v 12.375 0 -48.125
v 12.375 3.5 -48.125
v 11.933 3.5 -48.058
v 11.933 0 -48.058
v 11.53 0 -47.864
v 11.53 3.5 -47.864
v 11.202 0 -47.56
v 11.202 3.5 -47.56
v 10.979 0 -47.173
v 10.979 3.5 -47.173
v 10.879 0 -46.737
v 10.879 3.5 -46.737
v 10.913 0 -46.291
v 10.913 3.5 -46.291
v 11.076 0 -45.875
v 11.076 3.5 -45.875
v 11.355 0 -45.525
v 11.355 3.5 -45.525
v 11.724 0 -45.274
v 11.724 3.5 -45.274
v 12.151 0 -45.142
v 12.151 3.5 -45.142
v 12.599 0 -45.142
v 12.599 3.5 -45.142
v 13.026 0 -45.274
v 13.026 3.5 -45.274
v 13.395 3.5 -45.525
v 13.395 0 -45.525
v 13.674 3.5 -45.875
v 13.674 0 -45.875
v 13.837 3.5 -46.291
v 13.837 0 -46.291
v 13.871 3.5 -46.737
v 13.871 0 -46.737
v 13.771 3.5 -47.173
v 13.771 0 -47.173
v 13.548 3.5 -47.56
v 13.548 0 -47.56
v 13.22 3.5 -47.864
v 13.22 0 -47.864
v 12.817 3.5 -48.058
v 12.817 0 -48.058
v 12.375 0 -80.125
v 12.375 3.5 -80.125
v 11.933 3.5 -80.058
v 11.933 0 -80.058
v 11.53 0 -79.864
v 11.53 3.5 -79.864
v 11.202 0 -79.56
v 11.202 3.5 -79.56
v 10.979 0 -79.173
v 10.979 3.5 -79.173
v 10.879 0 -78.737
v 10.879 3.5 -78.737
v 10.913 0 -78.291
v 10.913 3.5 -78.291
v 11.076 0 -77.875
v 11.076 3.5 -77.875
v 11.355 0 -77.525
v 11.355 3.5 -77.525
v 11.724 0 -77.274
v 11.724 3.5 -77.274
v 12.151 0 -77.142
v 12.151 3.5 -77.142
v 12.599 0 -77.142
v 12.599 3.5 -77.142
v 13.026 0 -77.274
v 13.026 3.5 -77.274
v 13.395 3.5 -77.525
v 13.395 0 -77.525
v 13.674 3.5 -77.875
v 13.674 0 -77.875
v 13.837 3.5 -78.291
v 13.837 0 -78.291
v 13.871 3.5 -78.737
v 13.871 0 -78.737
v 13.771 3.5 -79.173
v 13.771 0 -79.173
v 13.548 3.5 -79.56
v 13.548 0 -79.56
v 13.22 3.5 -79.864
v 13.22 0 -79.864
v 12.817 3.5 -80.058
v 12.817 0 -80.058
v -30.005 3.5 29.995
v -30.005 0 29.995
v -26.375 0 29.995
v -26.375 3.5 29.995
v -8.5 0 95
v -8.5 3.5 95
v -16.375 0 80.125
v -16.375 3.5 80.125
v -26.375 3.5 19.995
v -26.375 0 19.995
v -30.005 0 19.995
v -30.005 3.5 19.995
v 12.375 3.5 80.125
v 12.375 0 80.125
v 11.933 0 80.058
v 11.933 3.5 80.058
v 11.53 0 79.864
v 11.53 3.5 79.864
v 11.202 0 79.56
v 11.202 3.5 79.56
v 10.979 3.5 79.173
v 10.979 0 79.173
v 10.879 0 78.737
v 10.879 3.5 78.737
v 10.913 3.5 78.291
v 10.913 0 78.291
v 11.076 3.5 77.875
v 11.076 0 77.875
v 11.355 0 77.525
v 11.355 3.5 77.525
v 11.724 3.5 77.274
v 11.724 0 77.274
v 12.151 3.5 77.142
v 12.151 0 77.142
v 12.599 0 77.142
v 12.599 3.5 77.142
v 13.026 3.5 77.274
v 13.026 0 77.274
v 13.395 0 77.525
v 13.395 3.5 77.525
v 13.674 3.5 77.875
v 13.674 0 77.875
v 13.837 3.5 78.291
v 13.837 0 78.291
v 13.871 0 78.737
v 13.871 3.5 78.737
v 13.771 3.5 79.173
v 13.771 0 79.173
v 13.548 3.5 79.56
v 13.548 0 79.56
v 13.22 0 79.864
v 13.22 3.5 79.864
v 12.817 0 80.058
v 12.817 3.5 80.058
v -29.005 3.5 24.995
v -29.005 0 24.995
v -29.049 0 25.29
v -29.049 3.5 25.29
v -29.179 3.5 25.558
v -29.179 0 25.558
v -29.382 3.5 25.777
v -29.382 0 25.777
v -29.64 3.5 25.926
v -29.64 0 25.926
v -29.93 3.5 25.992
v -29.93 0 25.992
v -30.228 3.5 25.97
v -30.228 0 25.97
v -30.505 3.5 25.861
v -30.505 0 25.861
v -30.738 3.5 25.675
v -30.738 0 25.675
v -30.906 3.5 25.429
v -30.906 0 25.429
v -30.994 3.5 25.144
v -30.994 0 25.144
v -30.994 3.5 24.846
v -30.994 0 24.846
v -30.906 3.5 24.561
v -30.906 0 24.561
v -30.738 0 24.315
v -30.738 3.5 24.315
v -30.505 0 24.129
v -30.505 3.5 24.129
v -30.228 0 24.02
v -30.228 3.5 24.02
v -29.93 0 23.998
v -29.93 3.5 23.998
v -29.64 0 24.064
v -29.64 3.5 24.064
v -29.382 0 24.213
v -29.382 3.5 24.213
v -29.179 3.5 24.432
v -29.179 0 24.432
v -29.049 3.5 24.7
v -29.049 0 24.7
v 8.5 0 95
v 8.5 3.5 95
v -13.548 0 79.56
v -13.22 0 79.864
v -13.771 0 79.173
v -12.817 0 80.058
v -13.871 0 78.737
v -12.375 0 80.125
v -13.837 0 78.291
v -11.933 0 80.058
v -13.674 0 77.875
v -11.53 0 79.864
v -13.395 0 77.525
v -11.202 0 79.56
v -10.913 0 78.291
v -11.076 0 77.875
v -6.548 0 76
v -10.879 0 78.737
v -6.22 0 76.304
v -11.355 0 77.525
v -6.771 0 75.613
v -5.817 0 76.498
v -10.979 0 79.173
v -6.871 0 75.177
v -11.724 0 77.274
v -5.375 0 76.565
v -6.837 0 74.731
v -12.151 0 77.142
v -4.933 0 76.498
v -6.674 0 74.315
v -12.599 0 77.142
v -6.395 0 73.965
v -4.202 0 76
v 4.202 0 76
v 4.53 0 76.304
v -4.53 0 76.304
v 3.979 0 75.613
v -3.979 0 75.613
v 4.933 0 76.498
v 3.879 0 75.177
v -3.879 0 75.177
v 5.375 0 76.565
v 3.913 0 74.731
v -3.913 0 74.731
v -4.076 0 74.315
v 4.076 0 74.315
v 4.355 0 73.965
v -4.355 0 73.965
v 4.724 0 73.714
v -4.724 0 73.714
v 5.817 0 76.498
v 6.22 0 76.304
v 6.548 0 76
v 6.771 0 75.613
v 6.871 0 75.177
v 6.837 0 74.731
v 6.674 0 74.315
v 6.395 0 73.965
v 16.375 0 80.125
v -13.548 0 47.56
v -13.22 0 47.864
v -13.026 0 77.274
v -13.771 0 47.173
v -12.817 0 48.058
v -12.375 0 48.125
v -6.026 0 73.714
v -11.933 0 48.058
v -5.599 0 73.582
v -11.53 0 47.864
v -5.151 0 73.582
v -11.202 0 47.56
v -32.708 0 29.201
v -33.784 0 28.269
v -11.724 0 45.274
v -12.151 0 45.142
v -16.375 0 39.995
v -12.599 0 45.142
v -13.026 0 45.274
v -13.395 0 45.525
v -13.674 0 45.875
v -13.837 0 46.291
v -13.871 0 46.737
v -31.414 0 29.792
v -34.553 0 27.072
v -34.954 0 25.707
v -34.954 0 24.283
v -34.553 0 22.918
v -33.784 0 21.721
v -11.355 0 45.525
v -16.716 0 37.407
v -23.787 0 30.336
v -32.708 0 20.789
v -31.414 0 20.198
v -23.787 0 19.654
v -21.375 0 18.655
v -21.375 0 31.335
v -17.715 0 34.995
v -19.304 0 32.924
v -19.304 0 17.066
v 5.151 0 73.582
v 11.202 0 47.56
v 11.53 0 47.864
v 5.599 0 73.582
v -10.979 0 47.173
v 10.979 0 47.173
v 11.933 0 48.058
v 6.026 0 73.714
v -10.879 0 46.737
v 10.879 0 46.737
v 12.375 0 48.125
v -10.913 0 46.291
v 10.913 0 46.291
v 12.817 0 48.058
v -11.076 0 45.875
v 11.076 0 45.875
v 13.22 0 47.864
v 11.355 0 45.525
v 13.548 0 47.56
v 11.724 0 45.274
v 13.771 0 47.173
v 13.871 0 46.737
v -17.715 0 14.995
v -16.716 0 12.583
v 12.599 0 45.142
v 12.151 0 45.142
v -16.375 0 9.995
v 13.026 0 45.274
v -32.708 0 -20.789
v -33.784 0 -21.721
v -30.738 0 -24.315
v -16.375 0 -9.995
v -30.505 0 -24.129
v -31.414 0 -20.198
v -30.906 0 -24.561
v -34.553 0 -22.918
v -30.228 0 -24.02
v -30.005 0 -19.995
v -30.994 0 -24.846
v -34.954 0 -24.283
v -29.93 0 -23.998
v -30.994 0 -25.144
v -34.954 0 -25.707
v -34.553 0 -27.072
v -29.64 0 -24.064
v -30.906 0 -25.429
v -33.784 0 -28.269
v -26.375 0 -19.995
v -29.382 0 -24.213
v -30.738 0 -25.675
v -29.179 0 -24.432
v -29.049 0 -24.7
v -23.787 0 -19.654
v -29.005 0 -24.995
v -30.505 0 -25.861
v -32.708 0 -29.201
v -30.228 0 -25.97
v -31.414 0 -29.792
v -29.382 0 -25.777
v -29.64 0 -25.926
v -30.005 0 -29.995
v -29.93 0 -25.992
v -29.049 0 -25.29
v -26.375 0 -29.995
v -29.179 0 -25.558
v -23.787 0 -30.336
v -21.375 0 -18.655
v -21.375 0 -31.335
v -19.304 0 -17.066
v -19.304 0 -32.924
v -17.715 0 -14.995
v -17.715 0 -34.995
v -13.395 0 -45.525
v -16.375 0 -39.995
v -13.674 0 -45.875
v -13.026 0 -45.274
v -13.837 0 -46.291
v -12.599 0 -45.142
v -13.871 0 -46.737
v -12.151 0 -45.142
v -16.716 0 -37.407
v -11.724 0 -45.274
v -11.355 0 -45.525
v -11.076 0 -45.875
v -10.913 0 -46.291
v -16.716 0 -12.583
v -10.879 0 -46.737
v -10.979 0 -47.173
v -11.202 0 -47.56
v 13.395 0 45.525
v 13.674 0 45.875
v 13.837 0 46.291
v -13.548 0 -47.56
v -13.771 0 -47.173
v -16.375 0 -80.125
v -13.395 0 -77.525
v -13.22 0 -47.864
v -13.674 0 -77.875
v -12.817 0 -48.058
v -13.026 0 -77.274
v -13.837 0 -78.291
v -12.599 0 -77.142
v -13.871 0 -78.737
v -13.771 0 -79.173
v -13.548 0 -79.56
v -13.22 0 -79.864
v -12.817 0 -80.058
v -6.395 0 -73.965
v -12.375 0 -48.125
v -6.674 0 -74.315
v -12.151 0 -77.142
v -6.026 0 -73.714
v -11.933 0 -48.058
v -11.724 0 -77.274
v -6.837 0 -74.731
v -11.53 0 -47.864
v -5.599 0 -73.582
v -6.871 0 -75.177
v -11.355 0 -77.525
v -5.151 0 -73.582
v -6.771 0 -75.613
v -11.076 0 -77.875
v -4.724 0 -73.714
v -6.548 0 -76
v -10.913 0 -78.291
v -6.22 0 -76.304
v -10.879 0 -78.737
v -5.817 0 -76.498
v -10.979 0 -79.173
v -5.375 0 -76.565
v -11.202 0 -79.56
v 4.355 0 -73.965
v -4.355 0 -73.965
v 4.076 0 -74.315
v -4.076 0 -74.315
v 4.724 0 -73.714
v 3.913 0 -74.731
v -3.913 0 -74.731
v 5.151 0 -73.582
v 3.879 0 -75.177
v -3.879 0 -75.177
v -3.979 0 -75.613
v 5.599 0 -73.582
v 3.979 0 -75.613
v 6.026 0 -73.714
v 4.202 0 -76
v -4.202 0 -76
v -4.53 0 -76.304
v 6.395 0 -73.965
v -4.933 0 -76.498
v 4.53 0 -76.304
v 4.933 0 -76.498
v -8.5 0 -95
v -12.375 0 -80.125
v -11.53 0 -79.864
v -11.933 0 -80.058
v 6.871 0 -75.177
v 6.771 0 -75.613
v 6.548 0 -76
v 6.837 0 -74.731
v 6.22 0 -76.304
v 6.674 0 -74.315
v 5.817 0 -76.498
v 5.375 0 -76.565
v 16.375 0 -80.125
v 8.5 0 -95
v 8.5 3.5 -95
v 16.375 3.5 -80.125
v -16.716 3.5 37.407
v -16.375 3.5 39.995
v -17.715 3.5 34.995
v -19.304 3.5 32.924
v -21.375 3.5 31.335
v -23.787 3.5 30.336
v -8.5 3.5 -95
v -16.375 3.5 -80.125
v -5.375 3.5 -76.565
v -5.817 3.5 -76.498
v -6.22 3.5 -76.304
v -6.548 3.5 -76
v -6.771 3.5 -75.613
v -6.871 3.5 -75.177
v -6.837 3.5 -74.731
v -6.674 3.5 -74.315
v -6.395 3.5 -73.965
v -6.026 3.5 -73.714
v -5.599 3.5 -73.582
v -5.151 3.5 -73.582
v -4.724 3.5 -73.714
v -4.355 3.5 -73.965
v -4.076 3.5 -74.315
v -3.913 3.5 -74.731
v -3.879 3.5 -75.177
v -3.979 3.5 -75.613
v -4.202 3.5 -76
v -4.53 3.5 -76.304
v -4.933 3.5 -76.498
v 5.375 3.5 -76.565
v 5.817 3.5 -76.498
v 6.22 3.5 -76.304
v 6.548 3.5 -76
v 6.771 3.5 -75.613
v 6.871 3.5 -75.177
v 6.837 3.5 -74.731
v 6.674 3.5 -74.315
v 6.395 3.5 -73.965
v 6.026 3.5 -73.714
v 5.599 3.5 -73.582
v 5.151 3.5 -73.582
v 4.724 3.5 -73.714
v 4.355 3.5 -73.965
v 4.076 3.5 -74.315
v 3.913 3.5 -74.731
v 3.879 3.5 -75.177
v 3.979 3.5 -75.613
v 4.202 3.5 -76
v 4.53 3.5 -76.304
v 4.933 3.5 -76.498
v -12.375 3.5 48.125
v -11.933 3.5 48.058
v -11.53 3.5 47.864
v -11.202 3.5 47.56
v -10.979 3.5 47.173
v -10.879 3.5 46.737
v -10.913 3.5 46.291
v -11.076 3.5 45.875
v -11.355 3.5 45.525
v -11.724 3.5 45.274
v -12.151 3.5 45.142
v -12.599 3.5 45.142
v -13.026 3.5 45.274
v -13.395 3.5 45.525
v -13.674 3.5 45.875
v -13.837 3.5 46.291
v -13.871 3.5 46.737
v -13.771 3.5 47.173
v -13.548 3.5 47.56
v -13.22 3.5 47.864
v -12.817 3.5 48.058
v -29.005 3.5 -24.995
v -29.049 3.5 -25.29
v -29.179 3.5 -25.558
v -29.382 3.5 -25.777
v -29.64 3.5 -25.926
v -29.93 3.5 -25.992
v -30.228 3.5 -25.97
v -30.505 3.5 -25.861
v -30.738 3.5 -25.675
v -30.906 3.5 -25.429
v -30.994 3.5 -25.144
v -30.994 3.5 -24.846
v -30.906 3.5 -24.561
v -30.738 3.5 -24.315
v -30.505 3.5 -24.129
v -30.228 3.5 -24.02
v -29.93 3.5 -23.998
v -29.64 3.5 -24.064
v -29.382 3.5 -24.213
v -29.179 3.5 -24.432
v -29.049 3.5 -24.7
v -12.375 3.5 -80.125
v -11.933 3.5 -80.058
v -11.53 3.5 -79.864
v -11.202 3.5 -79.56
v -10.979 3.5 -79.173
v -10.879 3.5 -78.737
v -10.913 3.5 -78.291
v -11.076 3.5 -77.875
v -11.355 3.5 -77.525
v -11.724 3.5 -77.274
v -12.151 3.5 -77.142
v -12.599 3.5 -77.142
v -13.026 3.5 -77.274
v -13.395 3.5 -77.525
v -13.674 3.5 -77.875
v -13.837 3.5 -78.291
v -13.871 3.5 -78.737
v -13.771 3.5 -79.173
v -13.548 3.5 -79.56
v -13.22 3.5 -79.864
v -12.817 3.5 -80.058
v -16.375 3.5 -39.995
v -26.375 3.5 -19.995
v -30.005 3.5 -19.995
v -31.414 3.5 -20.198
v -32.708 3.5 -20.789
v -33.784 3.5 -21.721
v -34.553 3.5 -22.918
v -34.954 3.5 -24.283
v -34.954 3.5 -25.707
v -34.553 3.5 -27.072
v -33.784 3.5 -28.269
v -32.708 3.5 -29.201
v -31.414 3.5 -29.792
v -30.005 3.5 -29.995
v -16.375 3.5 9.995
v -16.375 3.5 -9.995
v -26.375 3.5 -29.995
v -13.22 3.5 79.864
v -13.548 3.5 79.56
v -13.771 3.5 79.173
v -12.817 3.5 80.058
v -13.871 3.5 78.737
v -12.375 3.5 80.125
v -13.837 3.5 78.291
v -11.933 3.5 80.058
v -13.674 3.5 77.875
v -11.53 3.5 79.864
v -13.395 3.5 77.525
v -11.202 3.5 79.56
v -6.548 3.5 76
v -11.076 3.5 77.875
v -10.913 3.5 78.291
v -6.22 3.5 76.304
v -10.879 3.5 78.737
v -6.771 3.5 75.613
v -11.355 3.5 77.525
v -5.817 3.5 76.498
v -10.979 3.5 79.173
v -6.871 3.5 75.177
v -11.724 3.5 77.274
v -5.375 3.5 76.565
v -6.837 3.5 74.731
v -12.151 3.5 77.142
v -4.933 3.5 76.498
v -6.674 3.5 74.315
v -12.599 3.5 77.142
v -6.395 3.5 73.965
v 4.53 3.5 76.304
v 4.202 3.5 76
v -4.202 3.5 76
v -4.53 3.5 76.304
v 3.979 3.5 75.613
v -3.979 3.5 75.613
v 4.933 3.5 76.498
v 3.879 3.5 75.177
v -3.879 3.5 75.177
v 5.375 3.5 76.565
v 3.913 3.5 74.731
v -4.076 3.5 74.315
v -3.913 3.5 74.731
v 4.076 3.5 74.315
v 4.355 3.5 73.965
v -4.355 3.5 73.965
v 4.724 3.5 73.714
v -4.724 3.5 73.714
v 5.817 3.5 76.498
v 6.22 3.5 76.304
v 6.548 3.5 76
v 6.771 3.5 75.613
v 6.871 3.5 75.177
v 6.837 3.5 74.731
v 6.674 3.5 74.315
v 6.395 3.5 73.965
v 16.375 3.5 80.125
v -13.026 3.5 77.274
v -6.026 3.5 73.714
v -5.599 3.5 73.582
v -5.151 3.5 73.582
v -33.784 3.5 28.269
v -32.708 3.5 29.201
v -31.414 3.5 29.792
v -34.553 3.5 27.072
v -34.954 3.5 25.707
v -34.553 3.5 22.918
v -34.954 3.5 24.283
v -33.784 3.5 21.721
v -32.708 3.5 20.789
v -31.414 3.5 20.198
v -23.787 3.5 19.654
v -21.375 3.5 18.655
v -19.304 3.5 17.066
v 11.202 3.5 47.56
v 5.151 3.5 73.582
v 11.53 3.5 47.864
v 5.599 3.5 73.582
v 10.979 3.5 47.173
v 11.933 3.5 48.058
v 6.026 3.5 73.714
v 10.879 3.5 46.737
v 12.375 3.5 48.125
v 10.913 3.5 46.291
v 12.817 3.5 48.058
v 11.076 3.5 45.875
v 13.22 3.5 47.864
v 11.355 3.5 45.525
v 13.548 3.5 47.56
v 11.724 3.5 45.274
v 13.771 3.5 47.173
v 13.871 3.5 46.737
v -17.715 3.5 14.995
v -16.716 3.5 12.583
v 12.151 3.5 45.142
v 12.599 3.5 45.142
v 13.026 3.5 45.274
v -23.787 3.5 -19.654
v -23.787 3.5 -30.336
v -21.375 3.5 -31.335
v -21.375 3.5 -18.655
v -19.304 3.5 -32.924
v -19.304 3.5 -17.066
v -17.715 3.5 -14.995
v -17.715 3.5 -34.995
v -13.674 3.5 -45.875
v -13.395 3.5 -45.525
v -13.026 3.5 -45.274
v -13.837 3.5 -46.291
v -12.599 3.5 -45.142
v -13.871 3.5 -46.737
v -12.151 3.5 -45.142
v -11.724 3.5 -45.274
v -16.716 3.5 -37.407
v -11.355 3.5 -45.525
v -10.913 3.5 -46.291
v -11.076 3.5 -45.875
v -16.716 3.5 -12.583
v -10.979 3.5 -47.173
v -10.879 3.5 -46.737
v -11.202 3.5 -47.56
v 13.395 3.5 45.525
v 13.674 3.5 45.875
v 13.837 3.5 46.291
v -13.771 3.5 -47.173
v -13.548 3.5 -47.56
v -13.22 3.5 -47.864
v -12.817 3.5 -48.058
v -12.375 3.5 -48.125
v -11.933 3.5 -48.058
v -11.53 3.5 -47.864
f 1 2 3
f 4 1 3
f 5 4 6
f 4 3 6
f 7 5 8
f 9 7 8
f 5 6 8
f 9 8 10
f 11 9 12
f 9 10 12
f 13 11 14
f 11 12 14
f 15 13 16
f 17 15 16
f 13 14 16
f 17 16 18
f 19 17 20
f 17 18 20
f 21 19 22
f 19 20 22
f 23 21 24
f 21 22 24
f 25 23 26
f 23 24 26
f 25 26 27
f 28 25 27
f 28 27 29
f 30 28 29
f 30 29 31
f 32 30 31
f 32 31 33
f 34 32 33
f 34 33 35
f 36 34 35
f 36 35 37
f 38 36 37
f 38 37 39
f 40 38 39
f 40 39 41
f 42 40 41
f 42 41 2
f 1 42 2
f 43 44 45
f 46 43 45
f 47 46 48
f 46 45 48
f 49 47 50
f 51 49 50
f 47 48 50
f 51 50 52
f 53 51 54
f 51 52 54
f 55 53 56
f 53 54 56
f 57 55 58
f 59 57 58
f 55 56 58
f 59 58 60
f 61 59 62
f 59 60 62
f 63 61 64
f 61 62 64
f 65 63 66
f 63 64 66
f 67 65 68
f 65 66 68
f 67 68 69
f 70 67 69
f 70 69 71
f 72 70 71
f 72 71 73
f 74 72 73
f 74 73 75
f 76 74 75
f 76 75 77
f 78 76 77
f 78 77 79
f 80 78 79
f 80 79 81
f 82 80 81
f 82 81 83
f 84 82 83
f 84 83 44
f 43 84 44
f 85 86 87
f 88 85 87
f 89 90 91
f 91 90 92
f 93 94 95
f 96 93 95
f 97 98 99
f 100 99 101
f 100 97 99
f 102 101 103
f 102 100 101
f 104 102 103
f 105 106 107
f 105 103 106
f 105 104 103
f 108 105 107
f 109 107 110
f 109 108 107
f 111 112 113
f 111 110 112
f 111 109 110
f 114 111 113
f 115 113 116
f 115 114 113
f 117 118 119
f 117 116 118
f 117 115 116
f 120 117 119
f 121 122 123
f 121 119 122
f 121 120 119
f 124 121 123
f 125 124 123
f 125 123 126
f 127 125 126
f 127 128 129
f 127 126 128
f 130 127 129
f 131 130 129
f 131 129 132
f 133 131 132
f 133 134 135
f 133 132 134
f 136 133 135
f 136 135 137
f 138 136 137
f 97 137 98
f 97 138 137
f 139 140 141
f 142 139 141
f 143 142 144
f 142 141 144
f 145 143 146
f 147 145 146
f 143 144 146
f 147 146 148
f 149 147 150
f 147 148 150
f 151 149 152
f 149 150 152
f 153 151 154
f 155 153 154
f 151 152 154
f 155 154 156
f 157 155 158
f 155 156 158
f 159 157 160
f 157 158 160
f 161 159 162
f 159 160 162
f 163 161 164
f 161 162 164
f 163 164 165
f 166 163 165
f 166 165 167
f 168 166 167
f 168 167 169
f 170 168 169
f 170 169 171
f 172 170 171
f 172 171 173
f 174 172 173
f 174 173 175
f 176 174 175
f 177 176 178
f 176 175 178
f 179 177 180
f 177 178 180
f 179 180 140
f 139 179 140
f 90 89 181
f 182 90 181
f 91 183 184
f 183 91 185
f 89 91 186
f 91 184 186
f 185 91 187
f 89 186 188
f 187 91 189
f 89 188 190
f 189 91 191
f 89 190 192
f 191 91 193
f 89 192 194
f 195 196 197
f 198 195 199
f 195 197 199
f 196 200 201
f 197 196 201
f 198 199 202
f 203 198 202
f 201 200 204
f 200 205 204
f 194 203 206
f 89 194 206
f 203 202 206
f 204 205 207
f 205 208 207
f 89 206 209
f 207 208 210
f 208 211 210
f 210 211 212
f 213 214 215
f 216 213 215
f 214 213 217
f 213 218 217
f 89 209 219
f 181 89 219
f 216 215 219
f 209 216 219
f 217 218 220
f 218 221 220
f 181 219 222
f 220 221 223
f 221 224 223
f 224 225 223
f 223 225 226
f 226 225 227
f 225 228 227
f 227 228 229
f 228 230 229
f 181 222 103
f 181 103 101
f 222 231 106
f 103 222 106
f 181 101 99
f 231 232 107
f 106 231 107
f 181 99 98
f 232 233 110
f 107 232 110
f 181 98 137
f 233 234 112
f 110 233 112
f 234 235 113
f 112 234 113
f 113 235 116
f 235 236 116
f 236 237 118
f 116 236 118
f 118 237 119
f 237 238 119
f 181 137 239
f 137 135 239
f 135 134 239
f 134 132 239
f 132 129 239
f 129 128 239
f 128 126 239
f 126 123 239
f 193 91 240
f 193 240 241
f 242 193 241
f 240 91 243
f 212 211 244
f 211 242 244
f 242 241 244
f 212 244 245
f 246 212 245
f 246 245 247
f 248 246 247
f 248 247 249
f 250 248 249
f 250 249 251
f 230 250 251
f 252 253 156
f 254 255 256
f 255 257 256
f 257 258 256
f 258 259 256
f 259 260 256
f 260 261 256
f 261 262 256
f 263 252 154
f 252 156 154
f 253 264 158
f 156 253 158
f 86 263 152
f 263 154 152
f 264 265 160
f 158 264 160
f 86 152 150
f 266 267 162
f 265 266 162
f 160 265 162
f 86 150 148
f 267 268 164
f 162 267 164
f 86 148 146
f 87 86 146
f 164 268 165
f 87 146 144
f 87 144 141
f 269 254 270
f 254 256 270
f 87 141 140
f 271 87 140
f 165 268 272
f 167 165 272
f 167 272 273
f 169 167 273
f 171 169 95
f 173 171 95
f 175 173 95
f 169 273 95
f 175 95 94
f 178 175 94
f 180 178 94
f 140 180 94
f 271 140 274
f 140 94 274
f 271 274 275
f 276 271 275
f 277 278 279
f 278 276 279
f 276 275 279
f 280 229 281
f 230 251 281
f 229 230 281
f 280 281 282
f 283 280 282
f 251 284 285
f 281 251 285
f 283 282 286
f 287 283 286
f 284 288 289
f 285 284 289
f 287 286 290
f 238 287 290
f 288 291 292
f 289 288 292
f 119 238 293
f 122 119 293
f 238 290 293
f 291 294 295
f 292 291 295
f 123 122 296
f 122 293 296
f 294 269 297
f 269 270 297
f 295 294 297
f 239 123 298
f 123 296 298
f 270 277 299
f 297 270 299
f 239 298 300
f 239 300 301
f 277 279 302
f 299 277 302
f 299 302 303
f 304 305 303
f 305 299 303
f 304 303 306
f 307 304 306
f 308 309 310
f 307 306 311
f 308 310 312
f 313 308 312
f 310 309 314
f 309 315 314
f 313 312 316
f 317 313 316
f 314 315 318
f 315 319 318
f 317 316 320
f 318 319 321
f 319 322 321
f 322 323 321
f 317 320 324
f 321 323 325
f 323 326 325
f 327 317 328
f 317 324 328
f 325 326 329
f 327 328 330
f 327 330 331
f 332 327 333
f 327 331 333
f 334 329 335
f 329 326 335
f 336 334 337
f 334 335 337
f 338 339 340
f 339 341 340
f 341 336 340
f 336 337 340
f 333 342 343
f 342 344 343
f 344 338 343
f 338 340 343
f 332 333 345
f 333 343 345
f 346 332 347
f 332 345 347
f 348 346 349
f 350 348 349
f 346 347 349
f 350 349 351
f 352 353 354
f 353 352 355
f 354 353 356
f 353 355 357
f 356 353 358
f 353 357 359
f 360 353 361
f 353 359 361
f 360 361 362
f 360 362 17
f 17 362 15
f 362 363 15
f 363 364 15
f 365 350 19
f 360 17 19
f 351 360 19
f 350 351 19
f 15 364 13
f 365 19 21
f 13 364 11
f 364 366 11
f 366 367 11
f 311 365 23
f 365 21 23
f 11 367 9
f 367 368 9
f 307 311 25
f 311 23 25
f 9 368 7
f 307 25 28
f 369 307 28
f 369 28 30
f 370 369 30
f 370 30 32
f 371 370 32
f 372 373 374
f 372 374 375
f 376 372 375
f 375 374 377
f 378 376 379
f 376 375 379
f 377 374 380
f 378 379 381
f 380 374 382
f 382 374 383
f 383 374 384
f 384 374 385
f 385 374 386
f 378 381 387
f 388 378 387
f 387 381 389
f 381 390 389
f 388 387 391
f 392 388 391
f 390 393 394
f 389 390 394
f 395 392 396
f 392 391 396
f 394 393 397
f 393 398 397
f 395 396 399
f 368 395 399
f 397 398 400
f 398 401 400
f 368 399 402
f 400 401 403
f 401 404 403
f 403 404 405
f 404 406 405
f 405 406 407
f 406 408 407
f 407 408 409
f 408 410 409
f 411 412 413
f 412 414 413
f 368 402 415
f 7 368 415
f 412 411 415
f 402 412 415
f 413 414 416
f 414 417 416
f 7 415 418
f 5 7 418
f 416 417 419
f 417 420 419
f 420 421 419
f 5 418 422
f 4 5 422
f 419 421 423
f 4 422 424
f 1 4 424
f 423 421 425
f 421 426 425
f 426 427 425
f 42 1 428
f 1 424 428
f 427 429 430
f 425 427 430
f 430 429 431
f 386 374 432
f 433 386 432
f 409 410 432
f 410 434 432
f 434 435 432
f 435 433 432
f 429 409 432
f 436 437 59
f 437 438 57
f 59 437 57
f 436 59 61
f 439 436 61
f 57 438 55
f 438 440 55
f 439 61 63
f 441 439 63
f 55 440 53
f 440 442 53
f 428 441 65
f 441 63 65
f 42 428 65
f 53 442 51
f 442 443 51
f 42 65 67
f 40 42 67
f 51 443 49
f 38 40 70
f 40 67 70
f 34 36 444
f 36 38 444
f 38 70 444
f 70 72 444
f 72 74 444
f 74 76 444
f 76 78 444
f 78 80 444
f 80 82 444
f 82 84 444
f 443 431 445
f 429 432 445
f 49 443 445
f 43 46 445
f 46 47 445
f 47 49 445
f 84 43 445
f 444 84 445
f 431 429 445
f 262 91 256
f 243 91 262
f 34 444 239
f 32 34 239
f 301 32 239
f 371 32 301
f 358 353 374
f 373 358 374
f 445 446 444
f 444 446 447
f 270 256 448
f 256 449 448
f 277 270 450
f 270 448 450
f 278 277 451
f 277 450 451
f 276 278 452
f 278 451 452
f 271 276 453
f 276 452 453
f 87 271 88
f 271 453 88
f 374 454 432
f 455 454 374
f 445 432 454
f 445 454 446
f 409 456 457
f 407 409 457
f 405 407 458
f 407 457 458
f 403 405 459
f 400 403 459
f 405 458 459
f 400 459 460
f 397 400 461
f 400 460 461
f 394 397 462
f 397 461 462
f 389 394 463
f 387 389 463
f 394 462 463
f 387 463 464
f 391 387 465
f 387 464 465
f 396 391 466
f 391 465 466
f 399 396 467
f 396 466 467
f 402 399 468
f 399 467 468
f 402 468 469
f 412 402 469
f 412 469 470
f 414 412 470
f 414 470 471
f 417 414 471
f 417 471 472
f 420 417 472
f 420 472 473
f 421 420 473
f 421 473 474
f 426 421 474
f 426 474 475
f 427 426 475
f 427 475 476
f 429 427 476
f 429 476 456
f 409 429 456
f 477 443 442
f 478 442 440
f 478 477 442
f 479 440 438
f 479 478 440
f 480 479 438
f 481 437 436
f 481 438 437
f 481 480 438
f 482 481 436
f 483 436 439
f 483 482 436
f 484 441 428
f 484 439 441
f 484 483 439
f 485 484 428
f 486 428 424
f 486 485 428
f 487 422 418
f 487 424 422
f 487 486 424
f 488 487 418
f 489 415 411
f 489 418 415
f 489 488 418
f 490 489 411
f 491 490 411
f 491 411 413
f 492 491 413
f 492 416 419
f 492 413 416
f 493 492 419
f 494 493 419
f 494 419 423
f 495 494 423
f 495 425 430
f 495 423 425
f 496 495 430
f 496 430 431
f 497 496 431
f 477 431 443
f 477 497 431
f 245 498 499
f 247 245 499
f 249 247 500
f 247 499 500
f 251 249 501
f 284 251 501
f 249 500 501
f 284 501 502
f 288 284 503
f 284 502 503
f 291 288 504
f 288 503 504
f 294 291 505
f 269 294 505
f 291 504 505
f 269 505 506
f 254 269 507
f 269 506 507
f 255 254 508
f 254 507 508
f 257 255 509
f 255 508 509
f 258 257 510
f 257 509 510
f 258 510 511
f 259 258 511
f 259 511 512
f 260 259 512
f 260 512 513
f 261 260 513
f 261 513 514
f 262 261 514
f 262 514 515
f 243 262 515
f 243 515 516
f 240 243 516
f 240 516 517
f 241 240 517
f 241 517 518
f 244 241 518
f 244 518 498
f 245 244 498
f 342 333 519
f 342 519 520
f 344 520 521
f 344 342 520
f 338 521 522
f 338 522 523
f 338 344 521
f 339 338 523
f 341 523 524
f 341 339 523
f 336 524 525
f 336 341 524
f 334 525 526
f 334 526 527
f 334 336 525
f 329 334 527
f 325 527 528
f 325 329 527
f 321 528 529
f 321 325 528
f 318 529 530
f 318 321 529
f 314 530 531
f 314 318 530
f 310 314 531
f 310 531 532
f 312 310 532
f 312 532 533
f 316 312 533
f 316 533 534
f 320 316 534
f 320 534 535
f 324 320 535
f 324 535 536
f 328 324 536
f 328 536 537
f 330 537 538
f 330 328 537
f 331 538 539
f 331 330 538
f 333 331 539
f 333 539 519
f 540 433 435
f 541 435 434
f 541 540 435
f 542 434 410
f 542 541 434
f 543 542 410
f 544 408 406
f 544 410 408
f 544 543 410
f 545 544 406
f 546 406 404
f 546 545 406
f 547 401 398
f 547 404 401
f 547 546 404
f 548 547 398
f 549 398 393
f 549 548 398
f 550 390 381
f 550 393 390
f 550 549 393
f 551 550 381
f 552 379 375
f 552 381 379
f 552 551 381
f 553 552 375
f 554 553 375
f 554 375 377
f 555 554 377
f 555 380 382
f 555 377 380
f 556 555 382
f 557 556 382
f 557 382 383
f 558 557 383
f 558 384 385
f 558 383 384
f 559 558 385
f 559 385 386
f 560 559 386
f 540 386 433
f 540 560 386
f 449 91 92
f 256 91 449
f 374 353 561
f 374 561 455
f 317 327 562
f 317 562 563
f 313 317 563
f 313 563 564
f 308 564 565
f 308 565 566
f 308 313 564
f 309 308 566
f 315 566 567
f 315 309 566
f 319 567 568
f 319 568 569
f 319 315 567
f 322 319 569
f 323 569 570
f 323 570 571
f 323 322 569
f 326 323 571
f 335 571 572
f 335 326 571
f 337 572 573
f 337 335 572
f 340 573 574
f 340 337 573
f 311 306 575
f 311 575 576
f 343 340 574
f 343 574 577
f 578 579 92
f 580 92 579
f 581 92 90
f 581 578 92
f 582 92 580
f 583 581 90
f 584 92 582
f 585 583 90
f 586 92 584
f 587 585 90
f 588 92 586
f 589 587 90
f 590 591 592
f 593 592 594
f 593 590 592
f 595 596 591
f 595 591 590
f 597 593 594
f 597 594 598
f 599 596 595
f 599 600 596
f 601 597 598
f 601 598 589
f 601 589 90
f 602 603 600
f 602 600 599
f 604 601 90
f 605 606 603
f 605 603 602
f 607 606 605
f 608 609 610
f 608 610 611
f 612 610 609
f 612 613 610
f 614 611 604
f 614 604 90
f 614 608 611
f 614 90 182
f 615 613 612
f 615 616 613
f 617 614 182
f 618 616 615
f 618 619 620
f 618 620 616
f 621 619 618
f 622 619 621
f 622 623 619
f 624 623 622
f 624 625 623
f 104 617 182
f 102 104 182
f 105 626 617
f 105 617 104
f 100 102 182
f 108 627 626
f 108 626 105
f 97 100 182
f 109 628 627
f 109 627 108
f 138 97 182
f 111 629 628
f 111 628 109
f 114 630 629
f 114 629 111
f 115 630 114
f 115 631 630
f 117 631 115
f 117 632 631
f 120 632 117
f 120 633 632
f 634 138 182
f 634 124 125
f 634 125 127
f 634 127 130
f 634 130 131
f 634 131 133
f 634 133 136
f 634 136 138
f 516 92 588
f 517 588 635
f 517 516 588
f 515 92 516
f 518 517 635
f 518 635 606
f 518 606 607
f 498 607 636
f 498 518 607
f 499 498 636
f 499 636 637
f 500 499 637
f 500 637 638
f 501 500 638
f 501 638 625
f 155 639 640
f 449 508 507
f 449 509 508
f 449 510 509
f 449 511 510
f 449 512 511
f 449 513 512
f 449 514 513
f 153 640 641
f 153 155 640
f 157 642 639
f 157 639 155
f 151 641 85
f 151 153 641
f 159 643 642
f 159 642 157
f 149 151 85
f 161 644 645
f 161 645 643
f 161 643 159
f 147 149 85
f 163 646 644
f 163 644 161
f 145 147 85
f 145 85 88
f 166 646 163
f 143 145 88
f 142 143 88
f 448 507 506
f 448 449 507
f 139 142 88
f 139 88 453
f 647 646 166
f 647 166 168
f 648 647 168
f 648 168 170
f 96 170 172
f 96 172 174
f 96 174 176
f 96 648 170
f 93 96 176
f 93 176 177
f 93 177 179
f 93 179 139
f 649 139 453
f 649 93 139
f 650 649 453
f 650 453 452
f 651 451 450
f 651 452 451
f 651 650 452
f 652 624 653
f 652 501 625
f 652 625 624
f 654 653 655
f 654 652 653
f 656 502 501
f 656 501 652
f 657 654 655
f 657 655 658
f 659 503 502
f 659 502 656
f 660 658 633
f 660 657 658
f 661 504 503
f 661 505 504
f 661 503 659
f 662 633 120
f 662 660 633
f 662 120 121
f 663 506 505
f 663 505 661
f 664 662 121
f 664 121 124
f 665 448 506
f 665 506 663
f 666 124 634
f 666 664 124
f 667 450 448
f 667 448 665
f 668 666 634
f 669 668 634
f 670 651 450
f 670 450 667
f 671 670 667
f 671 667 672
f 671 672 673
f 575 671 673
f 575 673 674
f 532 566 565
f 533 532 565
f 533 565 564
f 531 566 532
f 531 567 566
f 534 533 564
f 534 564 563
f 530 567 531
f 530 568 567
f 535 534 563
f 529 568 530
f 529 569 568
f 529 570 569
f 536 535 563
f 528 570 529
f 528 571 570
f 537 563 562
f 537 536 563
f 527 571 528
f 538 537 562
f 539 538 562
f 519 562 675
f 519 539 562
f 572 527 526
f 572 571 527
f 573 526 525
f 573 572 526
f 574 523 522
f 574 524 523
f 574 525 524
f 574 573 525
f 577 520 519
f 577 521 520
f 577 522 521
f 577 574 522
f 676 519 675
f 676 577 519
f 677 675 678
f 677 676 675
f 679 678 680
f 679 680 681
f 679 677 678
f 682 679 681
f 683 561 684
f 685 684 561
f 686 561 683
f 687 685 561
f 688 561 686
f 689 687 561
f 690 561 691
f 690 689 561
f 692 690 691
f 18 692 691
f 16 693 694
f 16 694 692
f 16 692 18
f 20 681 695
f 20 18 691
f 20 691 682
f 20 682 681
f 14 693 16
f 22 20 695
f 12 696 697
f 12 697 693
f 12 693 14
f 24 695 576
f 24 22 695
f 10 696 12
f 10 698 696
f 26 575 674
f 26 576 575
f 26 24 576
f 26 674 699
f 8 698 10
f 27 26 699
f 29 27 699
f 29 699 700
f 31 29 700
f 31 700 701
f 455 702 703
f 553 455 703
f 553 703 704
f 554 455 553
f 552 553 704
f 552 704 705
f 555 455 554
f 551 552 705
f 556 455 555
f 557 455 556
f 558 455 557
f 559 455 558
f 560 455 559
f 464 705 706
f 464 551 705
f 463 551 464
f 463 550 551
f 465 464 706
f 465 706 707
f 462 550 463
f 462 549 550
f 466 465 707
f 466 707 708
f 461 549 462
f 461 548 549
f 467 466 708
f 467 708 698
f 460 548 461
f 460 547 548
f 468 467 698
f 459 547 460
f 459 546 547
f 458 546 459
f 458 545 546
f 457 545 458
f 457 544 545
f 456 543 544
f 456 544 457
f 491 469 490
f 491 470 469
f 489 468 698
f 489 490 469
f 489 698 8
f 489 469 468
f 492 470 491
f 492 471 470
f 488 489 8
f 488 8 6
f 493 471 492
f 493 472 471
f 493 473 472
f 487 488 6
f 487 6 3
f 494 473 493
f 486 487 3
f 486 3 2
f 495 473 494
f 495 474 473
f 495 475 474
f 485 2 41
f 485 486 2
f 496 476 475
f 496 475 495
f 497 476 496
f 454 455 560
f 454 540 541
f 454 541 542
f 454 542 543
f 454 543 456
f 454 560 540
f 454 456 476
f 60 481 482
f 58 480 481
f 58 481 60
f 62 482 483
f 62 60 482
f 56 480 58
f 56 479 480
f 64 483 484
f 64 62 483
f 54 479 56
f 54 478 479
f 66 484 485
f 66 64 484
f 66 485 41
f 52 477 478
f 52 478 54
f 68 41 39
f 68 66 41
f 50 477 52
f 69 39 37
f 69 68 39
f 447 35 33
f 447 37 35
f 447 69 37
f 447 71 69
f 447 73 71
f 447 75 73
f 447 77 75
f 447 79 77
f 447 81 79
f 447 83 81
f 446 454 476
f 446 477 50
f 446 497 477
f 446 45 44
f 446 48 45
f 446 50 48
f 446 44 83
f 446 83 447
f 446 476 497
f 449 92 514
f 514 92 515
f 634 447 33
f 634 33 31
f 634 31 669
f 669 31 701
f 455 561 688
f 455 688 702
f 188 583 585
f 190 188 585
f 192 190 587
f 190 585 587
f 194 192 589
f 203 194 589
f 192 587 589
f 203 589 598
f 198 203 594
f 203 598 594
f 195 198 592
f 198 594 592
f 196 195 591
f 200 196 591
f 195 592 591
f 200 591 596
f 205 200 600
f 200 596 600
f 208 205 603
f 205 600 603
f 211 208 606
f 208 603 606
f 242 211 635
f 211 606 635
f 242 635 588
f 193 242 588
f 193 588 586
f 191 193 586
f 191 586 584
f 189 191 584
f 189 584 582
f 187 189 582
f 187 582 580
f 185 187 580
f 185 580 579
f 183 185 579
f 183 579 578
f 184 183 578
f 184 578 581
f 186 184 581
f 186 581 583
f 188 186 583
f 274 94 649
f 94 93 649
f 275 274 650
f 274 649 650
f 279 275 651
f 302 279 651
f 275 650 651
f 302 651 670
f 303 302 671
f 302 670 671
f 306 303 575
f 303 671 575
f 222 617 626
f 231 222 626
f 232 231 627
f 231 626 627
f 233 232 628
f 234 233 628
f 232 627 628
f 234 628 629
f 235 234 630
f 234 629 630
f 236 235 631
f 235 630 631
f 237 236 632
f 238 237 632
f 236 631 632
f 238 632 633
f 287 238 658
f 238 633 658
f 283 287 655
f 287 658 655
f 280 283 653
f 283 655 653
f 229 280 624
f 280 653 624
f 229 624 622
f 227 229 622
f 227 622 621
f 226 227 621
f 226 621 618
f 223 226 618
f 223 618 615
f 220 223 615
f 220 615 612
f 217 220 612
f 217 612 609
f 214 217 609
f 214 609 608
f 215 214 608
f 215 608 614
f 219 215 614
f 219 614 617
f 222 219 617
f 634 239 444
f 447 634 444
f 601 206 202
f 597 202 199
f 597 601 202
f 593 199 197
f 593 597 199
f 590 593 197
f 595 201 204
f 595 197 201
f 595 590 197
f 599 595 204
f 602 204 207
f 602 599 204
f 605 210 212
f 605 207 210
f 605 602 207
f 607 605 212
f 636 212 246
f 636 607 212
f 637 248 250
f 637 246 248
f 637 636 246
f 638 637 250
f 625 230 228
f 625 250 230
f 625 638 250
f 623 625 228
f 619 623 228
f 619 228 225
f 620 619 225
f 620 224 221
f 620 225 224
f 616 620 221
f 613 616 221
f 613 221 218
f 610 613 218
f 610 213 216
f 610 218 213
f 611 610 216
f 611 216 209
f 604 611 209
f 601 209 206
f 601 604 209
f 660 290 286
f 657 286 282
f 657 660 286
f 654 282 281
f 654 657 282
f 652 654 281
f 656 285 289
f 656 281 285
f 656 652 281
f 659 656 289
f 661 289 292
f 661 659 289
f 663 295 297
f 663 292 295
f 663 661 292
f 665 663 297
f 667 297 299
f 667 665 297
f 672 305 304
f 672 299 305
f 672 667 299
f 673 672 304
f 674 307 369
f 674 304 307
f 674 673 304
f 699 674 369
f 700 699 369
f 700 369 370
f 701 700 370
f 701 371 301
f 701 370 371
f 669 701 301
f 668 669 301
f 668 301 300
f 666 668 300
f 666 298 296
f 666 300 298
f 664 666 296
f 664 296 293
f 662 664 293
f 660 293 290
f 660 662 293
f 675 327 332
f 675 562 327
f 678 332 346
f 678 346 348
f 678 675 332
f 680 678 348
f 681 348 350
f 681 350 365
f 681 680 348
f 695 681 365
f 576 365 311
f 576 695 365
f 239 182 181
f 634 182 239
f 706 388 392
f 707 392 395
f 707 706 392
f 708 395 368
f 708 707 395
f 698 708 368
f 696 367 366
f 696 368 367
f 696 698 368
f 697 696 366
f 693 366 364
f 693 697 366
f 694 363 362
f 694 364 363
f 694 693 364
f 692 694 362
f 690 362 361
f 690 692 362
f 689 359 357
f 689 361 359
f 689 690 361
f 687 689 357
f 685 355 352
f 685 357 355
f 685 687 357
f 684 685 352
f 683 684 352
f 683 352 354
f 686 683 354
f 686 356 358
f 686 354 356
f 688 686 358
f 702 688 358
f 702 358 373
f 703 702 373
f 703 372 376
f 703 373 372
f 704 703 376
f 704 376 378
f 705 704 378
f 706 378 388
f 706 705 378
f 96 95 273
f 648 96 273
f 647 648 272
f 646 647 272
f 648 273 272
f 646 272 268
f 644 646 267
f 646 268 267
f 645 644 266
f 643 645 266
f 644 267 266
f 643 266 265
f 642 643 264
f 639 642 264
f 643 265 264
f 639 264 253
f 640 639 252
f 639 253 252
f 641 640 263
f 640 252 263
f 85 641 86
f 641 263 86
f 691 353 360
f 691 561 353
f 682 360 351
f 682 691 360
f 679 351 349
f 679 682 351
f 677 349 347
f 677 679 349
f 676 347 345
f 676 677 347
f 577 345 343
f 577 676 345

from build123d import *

# Parameters (mm, degrees)
SKETCH1_W               = 32.75
SKETCH1_H               = 190
BOSS_EXTRUDE1_DEPTH     = 3.5
SKETCH3_R               = 1.5
CUT_EXTRUDE1_DEPTH      = 97.46445265
MIRROR2_COPY_1_SKETCH_R = 1.5
MIRROR2_COPY_1_DEPTH    = 97.46445265
SKETCH4_R               = 1.5
CUT_EXTRUDE2_DEPTH      = 97.46445265
MIRROR4_COPY_1_SKETCH_R = 1.5
MIRROR4_COPY_1_DEPTH    = 97.46445265
BOSS_EXTRUDE2_DEPTH     = 3.5
FILLET1_R               = 10
FILLET2_R               = 10
FILLET5_R               = 10
FILLET6_R               = 10
MIRROR14_COPY_1_DEPTH   = 3.5
FILLET7_R               = 10
FILLET8_R               = 10
CUT_EXTRUDE3_DEPTH      = 102.304491633


with BuildPart() as part:
    # Sketch1 → Boss-Extrude1 (new body)
    with BuildSketch(Plane(origin=(0, 0, 0), x_dir=(1, 0, 0), z_dir=(0, 1, 0))):
        Rectangle(SKETCH1_W, SKETCH1_H)
    extrude(amount=BOSS_EXTRUDE1_DEPTH)

    # Sketch3 → Cut-Extrude1 (cut, through all)
    with BuildSketch(Plane(origin=(0, 3.5, 0), x_dir=(1, 0, 0), z_dir=(0, 1, 0))):
        with Locations(Location((-12.375, -46.625, 0), (0, 0, 270))):
            Circle(SKETCH3_R)
        with Locations(Location((-12.375, -78.625, 0), (0, 0, 270))):
            Circle(SKETCH3_R)
        Polygon((-16.375, -95), (-8.5, -95), (-16.375, -80.125), align=None)
    cut_extrude1 = extrude(amount=-CUT_EXTRUDE1_DEPTH, mode=Mode.SUBTRACT)

    # Mirror1: Cut-Extrude1 across plane
    add(cut_extrude1.mirror(Plane(origin=(0, 0, 0), x_dir=(0, 0, 1), z_dir=(1, 0, 0))), mode=Mode.SUBTRACT)

    # Mirror2: Cut-Extrude1 across plane
    add(cut_extrude1.mirror(Plane.XY), mode=Mode.SUBTRACT)

    # Mirror2 copy 1 sketch → Mirror2 copy 1 (cut, through all)
    with BuildSketch(Plane(origin=(0, 3.5, 0), x_dir=(-1, 0, 0), z_dir=(0, 1, 0))):
        with Locations(Location((-12.375, -46.625, 0), (0, 0, 270))):
            Circle(MIRROR2_COPY_1_SKETCH_R)
        with Locations(Location((-12.375, -78.625, 0), (0, 0, 270))):
            Circle(MIRROR2_COPY_1_SKETCH_R)
        Polygon((-16.375, -95), (-8.5, -95), (-16.375, -80.125), align=None)
    extrude(amount=-MIRROR2_COPY_1_DEPTH, mode=Mode.SUBTRACT)

    # Sketch4 → Cut-Extrude2 (cut, through all)
    with BuildSketch(Plane(origin=(0, 3.5, 0), x_dir=(1, 0, 0), z_dir=(0, 1, 0))):
        with Locations(Location((5.375, -75.065, 0), (0, 0, 270))):
            Circle(SKETCH4_R)
    cut_extrude2 = extrude(amount=-CUT_EXTRUDE2_DEPTH, mode=Mode.SUBTRACT)

    # Mirror3: Cut-Extrude2 across plane
    add(cut_extrude2.mirror(Plane(origin=(0, 0, 0), x_dir=(0, 0, 1), z_dir=(1, 0, 0))), mode=Mode.SUBTRACT)

    # Mirror4: Cut-Extrude2 across plane
    add(cut_extrude2.mirror(Plane.XY), mode=Mode.SUBTRACT)

    # Mirror4 copy 1 sketch → Mirror4 copy 1 (cut, through all)
    with BuildSketch(Plane(origin=(0, 3.5, 0), x_dir=(-1, 0, 0), z_dir=(0, 1, 0))):
        with Locations(Location((5.375, -75.065, 0), (0, 0, 270))):
            Circle(MIRROR4_COPY_1_SKETCH_R)
    extrude(amount=-MIRROR4_COPY_1_DEPTH, mode=Mode.SUBTRACT)

    # Sketch5 → Boss-Extrude2 (add)
    with BuildSketch(Plane.XZ):
        with BuildLine():
            Line((17.375, 29.995), (16.375, 29.995))
            Line((16.375, 29.995), (16.375, 24.995))
            Line((16.375, 24.995), (16.375, 19.995))
            Line((16.375, 19.995), (30.005, 19.995))
            ThreePointArc((30.005, 19.995), (35.005, 24.995), (30.005, 29.995))
            Line((30.005, 29.995), (17.375, 29.995))
        make_face()
        with BuildLine():
            ThreePointArc((31.005, 24.995), (30.005, 23.995), (29.005, 24.995))
            ThreePointArc((29.005, 24.995), (30.005, 25.995), (31.005, 24.995))
        make_face(mode=Mode.SUBTRACT)
    boss_extrude2 = extrude(amount=-BOSS_EXTRUDE2_DEPTH)

    # Fillet1
    fillet1_edges = [part.edges().sort_by_distance(p)[0] for p in [
        (16.375, 1.75, 29.995),
    ]]
    fillet(fillet1_edges, radius=FILLET1_R)

    # Fillet2
    fillet2_edges = [part.edges().sort_by_distance(p)[0] for p in [
        (16.375, 1.75, 19.995),
    ]]
    fillet(fillet2_edges, radius=FILLET2_R)

    # Mirror13: Boss-Extrude2 across plane
    add(boss_extrude2.mirror(Plane(origin=(0, 0, 0), x_dir=(0, 0, 1), z_dir=(1, 0, 0))))

    # Fillet5
    fillet5_edges = [part.edges().sort_by_distance(p)[0] for p in [
        (-16.375, 1.75, 29.995),
    ]]
    fillet(fillet5_edges, radius=FILLET5_R)

    # Fillet6
    fillet6_edges = [part.edges().sort_by_distance(p)[0] for p in [
        (-16.375, 1.75, 19.995),
    ]]
    fillet(fillet6_edges, radius=FILLET6_R)

    # Mirror14: Boss-Extrude2 across plane
    add(boss_extrude2.mirror(Plane.XY))

    # Mirror14 copy 1 sketch → Mirror14 copy 1 (add)
    with BuildSketch(Plane(origin=(0, 0, 0), x_dir=(-1, 0, 0), z_dir=(0, -1, 0))):
        with BuildLine():
            Line((17.375, 29.995), (16.375, 29.995))
            Line((16.375, 29.995), (16.375, 24.995))
            Line((16.375, 24.995), (16.375, 19.995))
            Line((16.375, 19.995), (30.005, 19.995))
            ThreePointArc((30.005, 19.995), (35.005, 24.995), (30.005, 29.995))
            Line((30.005, 29.995), (17.375, 29.995))
        make_face()
        with BuildLine():
            ThreePointArc((31.005, 24.995), (30.005, 23.995), (29.005, 24.995))
            ThreePointArc((29.005, 24.995), (30.005, 25.995), (31.005, 24.995))
        make_face(mode=Mode.SUBTRACT)
    extrude(amount=-MIRROR14_COPY_1_DEPTH)

    # Fillet7
    fillet7_edges = [part.edges().sort_by_distance(p)[0] for p in [
        (-16.375, 1.75, -29.995),
    ]]
    fillet(fillet7_edges, radius=FILLET7_R)

    # Fillet8
    fillet8_edges = [part.edges().sort_by_distance(p)[0] for p in [
        (-16.375, 1.75, -19.995),
    ]]
    fillet(fillet8_edges, radius=FILLET8_R)

    # Sketch6 → Cut-Extrude3 (cut, through all)
    with BuildSketch(Plane(origin=(0, 3.5, 0), x_dir=(1, 0, 0), z_dir=(0, 1, 0))):
        Polygon((16.375, 5), (16.375, 44.924773713), (47.716486095, 44.924773713), (47.716486095, -55.8941685), (16.375, -55.8941685), align=None)
    extrude(amount=-CUT_EXTRUDE3_DEPTH, mode=Mode.SUBTRACT)


solid = part.part
